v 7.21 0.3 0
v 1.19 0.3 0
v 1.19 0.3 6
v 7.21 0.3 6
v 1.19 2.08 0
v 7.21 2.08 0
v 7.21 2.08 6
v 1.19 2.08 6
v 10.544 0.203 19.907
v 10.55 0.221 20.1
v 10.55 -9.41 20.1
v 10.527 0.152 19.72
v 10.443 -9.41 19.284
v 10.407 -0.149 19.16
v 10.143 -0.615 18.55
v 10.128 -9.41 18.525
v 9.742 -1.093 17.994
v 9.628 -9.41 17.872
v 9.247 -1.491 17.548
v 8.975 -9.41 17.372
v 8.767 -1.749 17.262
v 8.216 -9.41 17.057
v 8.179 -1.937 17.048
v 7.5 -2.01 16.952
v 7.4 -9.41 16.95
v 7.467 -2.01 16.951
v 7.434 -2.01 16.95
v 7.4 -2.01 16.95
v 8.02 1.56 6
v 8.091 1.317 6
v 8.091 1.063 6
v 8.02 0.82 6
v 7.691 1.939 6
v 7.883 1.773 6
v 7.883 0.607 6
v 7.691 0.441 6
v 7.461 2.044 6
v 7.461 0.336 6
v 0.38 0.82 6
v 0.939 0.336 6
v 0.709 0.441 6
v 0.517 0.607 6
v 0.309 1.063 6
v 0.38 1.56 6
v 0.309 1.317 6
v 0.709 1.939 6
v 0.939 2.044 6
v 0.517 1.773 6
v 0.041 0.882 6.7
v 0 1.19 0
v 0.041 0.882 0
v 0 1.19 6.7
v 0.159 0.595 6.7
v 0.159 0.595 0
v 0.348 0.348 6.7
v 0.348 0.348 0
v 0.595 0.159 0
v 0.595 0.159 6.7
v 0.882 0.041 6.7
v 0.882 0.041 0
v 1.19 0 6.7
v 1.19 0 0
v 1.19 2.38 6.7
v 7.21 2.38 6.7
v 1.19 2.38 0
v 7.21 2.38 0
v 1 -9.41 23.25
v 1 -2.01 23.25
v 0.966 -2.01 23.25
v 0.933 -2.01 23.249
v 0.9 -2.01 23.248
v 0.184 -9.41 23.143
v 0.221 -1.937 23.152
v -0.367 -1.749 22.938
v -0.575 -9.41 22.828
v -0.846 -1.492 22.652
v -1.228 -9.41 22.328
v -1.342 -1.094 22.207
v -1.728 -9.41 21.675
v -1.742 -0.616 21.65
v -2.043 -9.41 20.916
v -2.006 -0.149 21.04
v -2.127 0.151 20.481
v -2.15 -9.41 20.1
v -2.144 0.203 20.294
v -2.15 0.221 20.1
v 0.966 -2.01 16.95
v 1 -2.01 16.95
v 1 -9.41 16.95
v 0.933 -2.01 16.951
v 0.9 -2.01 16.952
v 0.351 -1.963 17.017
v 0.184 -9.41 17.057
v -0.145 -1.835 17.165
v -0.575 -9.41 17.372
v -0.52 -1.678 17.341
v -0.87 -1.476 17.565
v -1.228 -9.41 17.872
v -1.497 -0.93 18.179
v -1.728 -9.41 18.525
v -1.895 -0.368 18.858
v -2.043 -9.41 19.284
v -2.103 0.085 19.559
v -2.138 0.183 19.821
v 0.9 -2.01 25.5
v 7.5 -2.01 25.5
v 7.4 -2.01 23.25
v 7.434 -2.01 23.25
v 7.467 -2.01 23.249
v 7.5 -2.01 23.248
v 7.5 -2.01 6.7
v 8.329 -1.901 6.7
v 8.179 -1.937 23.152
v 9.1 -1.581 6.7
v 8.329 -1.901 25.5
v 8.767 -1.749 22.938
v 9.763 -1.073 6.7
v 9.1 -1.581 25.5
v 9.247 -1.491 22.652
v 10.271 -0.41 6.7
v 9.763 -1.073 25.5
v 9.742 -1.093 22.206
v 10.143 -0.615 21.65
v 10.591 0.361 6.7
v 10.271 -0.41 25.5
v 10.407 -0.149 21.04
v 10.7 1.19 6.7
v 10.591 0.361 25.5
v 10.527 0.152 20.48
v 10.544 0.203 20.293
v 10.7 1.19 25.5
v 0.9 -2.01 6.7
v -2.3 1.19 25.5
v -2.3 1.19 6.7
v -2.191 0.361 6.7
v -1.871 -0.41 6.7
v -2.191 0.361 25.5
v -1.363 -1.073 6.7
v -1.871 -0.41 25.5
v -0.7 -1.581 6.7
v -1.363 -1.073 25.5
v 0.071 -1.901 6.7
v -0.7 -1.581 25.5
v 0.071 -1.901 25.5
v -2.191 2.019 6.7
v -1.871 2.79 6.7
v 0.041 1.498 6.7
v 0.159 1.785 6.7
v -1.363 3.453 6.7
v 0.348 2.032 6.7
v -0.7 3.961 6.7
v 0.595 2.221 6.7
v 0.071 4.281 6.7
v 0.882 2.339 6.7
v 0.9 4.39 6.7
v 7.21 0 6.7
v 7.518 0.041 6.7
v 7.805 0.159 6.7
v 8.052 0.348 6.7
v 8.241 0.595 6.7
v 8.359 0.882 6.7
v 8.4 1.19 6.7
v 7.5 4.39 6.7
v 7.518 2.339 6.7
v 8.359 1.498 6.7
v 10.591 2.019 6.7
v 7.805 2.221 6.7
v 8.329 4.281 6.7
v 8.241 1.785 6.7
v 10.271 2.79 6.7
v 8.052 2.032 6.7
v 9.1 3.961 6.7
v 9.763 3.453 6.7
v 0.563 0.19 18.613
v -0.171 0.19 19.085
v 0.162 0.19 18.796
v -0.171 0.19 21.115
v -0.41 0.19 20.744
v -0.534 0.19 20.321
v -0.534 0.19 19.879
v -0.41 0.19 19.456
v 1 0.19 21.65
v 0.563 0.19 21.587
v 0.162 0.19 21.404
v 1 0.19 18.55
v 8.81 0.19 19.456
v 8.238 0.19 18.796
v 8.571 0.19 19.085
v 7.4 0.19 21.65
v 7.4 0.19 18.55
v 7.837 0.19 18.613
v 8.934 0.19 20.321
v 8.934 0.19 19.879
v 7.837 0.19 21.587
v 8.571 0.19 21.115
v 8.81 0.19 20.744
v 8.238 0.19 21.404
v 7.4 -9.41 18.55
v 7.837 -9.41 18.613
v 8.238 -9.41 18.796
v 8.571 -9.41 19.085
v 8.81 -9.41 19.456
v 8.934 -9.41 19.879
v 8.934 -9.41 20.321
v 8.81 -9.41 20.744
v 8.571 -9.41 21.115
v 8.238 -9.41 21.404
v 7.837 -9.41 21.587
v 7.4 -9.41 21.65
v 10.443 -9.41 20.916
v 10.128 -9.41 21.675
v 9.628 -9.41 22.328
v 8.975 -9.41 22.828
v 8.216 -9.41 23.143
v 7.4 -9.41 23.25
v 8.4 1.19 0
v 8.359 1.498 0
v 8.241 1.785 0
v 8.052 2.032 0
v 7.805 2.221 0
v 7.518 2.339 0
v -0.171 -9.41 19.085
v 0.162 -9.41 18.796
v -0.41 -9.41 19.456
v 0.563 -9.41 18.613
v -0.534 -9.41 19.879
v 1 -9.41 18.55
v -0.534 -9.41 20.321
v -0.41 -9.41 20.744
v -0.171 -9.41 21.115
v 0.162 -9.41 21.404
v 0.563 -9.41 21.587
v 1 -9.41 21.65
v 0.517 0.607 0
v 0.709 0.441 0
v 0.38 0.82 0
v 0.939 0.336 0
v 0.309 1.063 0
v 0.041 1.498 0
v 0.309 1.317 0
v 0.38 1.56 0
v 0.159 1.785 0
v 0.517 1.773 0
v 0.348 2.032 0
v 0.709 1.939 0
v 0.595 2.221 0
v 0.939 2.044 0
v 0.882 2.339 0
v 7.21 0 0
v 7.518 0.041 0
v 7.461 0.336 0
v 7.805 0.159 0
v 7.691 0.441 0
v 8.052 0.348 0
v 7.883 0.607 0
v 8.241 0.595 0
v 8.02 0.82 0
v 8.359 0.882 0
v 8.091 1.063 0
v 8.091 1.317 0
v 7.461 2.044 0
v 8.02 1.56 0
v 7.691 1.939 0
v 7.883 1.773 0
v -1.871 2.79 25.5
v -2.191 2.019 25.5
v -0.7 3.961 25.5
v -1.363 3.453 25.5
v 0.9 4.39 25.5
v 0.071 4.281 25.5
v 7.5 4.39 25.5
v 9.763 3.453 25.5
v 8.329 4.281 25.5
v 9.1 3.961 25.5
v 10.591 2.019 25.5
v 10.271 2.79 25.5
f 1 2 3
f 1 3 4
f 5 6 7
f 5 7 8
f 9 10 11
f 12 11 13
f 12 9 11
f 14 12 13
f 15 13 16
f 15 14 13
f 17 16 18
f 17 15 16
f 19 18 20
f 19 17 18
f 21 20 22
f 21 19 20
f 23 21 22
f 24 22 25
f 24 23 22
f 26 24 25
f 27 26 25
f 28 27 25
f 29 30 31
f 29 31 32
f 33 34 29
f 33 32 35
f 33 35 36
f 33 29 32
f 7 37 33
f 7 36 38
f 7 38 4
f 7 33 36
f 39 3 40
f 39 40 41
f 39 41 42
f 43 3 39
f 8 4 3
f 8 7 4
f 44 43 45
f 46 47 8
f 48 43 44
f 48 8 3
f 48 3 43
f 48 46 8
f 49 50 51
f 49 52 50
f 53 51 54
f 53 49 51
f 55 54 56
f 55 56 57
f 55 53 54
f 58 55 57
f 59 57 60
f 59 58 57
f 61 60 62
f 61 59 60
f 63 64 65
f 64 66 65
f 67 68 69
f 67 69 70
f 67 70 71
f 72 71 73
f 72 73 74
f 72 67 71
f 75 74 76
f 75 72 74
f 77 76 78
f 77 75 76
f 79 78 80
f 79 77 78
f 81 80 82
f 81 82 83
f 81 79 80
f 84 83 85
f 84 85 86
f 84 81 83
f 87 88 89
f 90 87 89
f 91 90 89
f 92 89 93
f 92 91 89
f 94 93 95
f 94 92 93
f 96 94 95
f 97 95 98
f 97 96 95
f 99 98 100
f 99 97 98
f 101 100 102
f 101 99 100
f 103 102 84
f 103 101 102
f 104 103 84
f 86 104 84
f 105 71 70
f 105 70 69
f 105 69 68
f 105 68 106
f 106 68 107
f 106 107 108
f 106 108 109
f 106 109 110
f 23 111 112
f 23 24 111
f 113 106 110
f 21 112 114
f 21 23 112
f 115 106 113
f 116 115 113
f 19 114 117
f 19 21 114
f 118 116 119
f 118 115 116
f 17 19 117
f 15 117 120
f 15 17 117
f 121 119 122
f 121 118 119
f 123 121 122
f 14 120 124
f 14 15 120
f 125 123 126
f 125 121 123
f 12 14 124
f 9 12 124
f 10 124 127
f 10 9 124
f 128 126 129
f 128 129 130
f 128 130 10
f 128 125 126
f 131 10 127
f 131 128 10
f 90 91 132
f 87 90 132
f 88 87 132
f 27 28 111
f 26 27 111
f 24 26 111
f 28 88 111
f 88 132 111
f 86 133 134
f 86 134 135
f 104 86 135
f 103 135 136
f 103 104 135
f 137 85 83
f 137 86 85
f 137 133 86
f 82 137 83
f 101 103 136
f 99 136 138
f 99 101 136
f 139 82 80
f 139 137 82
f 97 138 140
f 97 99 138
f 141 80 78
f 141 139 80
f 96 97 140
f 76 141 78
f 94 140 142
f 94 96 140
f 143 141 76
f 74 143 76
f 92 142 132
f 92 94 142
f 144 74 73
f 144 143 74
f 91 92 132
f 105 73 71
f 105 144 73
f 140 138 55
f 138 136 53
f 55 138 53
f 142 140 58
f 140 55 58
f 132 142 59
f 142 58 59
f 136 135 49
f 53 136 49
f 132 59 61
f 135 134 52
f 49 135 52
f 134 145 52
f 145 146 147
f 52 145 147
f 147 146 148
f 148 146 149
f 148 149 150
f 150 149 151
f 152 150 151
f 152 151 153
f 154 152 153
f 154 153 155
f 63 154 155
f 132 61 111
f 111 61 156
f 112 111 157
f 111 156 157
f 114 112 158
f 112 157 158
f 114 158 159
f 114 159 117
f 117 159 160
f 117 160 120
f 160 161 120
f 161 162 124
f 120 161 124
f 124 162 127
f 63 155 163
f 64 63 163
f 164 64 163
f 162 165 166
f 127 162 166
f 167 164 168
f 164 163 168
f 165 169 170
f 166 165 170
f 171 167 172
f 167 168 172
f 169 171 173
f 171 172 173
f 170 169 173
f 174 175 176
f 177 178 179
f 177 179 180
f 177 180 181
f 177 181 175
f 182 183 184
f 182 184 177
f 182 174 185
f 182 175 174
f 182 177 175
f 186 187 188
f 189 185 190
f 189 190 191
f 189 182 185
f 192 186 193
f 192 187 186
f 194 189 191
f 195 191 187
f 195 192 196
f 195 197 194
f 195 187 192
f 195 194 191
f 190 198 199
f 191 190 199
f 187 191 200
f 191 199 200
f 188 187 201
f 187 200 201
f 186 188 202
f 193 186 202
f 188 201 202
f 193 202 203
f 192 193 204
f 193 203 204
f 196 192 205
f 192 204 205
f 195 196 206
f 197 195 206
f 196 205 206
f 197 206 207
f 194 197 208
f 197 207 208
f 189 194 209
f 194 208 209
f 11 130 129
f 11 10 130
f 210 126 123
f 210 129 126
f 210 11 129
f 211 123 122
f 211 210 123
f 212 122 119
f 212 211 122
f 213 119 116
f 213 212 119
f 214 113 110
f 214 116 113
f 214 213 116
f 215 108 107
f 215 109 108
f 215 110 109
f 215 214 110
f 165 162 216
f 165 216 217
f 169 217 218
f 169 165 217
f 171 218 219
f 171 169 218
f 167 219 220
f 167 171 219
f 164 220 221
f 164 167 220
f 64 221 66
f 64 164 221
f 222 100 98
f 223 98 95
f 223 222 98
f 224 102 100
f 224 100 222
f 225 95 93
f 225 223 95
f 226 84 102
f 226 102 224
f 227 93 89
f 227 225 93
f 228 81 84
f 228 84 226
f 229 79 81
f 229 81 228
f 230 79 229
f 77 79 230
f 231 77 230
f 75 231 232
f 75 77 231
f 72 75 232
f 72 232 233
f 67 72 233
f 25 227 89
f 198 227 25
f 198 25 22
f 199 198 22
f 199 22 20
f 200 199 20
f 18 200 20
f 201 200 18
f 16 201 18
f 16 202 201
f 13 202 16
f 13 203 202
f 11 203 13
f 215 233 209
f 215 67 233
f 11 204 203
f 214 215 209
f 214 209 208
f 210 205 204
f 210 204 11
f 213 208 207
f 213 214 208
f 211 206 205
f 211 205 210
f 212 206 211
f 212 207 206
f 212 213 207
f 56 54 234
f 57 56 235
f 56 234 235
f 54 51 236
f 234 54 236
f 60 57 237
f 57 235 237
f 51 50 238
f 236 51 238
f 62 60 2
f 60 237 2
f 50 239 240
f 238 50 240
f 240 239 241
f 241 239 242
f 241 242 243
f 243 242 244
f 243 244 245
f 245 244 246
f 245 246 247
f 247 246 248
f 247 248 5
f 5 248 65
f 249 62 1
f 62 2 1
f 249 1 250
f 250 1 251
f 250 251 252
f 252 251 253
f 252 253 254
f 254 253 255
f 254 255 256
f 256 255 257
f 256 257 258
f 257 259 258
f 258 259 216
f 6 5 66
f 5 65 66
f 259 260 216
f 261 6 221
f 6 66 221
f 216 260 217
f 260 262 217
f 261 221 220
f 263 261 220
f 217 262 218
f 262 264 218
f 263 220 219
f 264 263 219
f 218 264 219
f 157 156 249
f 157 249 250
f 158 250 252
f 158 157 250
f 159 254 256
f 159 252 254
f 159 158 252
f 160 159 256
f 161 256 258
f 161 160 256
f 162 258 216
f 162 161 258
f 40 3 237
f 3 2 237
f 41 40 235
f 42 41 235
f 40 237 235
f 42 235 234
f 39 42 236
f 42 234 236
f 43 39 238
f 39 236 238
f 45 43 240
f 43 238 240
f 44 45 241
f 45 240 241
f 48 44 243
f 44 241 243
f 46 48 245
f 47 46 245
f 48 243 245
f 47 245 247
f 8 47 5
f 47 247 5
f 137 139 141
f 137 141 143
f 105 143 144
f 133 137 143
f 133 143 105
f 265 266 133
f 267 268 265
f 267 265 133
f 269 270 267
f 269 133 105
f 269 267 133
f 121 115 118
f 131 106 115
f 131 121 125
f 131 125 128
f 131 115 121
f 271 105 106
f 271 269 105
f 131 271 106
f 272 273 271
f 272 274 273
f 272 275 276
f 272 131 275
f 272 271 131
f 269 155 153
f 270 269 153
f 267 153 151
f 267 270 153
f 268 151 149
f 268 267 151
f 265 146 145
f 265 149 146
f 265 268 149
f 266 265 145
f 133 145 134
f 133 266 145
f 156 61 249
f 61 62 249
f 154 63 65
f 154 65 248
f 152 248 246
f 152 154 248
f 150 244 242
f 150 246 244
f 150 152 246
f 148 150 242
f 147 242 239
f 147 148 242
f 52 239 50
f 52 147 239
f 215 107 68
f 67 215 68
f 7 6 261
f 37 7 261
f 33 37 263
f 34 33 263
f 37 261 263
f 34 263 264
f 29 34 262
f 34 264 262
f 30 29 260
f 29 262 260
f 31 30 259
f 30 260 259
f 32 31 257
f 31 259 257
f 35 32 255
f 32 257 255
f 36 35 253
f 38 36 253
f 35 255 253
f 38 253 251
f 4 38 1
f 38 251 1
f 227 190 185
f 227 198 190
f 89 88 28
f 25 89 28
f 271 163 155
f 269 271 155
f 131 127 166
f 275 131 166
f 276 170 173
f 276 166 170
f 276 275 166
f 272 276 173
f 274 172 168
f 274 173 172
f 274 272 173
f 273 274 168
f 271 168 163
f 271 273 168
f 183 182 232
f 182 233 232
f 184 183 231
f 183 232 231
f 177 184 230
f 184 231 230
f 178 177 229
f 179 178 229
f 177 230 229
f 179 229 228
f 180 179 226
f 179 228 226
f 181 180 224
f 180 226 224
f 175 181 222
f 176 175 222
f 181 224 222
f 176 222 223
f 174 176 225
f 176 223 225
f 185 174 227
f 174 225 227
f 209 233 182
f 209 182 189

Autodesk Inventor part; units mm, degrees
ref_plane "YZ Plane" through (0, 0, 0) normal (1, 0, 0) x (0, 1, 0)
ref_plane "XZ Plane" through (0, 0, 0) normal (0, 1, 0) x (-1, 0, 0)
ref_plane "XY Plane" through (0, 0, 0) normal (0, 0, 1) x (1, 0, 0)
sketch "스케치1" plane through (0, 0, 0) normal (0, 0, 1) x (1, 0, 0)
  line L0 (0, 0) -> (8.4, 0)
  line L1 (8.4, 0) -> (8.4, 2.38)
  line L2 (8.4, 2.38) -> (0, 2.38)
  line L3 (0, 2.38) -> (0, 0)
  dimension "d0" = 8.4
  dimension "d1" = 2.38
extrude "돌출1" add sketch "스케치1" along normal blind 6.7
fillet "모깎기1" radius 1.19 4 edges at (8.4, 2.38, 3.35) (8.4, 0, 3.35) (0, 2.38, 3.35) (0, 0, 3.35)
sketch "스케치2" plane through (0, 0, 0) normal (0, 0, -1) x (-1, 0, 0)
  arc A0 (-7.21, 2.38) -> (-7.21, 0) centre (-7.21, 1.19) ccw projected
  arc A1 (-1.19, 0) -> (-1.19, 2.38) centre (-1.19, 1.19) ccw projected
  line L0 (-7.21, 2.38) -> (-1.19, 2.38) projected
  arc A2 (-7.21, 2.38) -> (-7.21, 0) centre (-7.21, 1.19) ccw projected
  line L1 (-1.19, 0) -> (-7.21, 0) projected
  arc A3 (-1.19, 0.3) -> (-1.19, 2.08) centre (-1.19, 1.19) ccw
  line L2 (-1.19, 0.3) -> (-7.21, 0.3)
  arc A4 (-7.21, 2.08) -> (-7.21, 0.3) centre (-7.21, 1.19) ccw
  line L3 (-7.21, 2.08) -> (-1.19, 2.08)
  point P0 (0, 0)
  dimension "d5" = 0.3
extrude "돌출2" cut sketch "스케치2" against normal blind 6 contours L2 A4 L3 A3
sketch "스케치3" plane through (0, 0, 6.7) normal (0, 0, 1) x (1, 0, 0)
  line L0 (7.21, 2.38) -> (1.19, 2.38) projected
  line L1 (4.2, 2.38) -> (4.2, 0)
  line L2 (1.19, 0) -> (7.21, 0) projected
  line L3 (4.2, 1.19) -> (0, 1.19)
  arc A0 (1.19, 2.38) -> (1.19, 0) centre (1.19, 1.19) ccw projected
  line L4 (4.2, 1.19) -> (8.4, 1.19)
  arc A1 (7.21, 0) -> (7.21, 2.38) centre (7.21, 1.19) ccw projected
  line L5 (-2.3, -2.01) -> (10.7, -2.01)
  line L6 (10.7, -2.01) -> (10.7, 4.39)
  line L7 (10.7, 4.39) -> (-2.3, 4.39)
  line L8 (-2.3, 4.39) -> (-2.3, -2.01)
  line L9 (-2.3, -2.01) -> (10.7, 4.39) construction
  line L10 (10.7, -2.01) -> (-2.3, 4.39) construction
  line L11 (-2.3, -2.01) -> (10.7, -2.01) construction
  point P0 (0, 0)
  dimension "d8" = 13
  dimension "d9" = 0
  dimension "d10" = 6.4
extrude "돌출3" add sketch "스케치3" along normal blind 18.8 contours A1 L4 L1 L0 | L1 L3 A0 L0 | A1 L2 L1 L4 | L1 L2 A0 L3 | L8 L7 L6 L5
fillet "모깎기2" radius 3.2 4 edges at (10.7, 4.39, 16.1) (10.7, -2.01, 16.1) (-2.3, 4.39, 16.1) (-2.3, -2.01, 16.1)
sketch "스케치4" plane through (0.9, -2.01, 6.7) normal (0, -1, 0) x (1, 0, 0)
  line L0 (0.29, 0) -> (6.31, 0) projected
  line L1 (3.3, 0) -> (3.3, 13.4)
  line L2 (3.3, 0) -> (16.7, 0) construction
  line L3 (9.65, 16.55) -> (-3.05, 16.55)
  line L4 (-3.05, 16.55) -> (-3.05, 10.25)
  line L5 (-3.05, 10.25) -> (9.65, 10.25)
  line L6 (9.65, 10.25) -> (9.65, 16.55)
  line L7 (9.65, 16.55) -> (-3.05, 10.25) construction
  line L8 (-3.05, 16.55) -> (9.65, 10.25) construction
  line L9 (9.65, 16.55) -> (22.35, 16.55) construction
  point P0 (-0.9, -6.7)
  dimension "d14" = 13.4
  dimension "d15" = 90
  dimension "d16" = 12.7
  dimension "d17" = 180
  dimension "d18" = 6.3
extrude "돌출4" add sketch "스케치4" along normal blind 7.4 and the other way blind 3
fillet "모깎기3" radius 3.15 4 edges at (10.55, -4.5943, 16.95) (10.55, -4.5943, 23.25) (-2.15, -4.5943, 16.95) (-2.15, -4.5943, 23.25)
sketch "스케치5" plane through (0.9, -9.41, 6.7) normal (0, -1, 0) x (1, 0, 0)
  arc A0 (0.1, 16.55) -> (0.1, 10.25) centre (0.1, 13.4) ccw projected
  line L0 (0.1, 10.25) -> (6.5, 10.25) projected
  arc A1 (6.5, 10.25) -> (6.5, 16.55) centre (6.5, 13.4) ccw projected
  line L1 (6.5, 16.55) -> (0.1, 16.55) projected
  line L2 (6.5, 11.85) -> (0.1, 11.85)
  arc A2 (0.1, 14.95) -> (0.1, 11.85) centre (0.1, 13.4) ccw
  line L3 (0.1, 14.95) -> (6.5, 14.95)
  arc A3 (6.5, 11.85) -> (6.5, 14.95) centre (6.5, 13.4) ccw
  point P0 (-0.9, -6.7)
  dimension "d24" = 1.6
extrude "돌출5" cut sketch "스케치5" against normal blind 9.6 contours L2 A2 L3 A3
properties part number "usb_connect"
